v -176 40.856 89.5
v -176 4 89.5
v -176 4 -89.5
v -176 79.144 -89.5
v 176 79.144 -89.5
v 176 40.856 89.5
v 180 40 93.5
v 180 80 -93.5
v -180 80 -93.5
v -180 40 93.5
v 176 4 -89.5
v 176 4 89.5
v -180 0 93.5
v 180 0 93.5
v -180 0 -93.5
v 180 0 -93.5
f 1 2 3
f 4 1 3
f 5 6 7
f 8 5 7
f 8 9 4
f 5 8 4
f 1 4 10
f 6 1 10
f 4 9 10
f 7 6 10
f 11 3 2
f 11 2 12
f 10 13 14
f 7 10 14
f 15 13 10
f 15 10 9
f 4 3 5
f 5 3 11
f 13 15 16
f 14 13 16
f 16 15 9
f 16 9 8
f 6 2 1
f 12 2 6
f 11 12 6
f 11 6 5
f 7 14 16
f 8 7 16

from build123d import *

# Parameters (mm, degrees)
CROQUIS1_W              = 360
CROQUIS1_H              = 187
SALIENTE_EXTRUIR1_DEPTH = 80
VACIADO1_T              = -4
CORTAR_EXTRUIR1_DEPTH   = 361


with BuildPart() as part:
    # Croquis1 → Saliente-Extruir1 (new body)
    with BuildSketch(Plane(origin=(0, 0, 0), x_dir=(1, 0, 0), z_dir=(0, 1, 0))):
        Rectangle(CROQUIS1_W, CROQUIS1_H)
    extrude(amount=SALIENTE_EXTRUIR1_DEPTH)

    # Vaciado1
    vaciado1_openings = [part.faces().sort_by_distance(p)[0] for p in [
        (0, 80, 0),
    ]]
    offset(amount=VACIADO1_T, openings=vaciado1_openings, kind=Kind.INTERSECTION)

    # Croquis2 → Cortar-Extruir1 (cut, through all)
    with BuildSketch(Plane.ZY.offset(180)):
        Polygon((-93.5, 80), (93.5, 40), (93.5, 80), align=None)
    extrude(amount=-CORTAR_EXTRUIR1_DEPTH, mode=Mode.SUBTRACT)


solid = part.part
